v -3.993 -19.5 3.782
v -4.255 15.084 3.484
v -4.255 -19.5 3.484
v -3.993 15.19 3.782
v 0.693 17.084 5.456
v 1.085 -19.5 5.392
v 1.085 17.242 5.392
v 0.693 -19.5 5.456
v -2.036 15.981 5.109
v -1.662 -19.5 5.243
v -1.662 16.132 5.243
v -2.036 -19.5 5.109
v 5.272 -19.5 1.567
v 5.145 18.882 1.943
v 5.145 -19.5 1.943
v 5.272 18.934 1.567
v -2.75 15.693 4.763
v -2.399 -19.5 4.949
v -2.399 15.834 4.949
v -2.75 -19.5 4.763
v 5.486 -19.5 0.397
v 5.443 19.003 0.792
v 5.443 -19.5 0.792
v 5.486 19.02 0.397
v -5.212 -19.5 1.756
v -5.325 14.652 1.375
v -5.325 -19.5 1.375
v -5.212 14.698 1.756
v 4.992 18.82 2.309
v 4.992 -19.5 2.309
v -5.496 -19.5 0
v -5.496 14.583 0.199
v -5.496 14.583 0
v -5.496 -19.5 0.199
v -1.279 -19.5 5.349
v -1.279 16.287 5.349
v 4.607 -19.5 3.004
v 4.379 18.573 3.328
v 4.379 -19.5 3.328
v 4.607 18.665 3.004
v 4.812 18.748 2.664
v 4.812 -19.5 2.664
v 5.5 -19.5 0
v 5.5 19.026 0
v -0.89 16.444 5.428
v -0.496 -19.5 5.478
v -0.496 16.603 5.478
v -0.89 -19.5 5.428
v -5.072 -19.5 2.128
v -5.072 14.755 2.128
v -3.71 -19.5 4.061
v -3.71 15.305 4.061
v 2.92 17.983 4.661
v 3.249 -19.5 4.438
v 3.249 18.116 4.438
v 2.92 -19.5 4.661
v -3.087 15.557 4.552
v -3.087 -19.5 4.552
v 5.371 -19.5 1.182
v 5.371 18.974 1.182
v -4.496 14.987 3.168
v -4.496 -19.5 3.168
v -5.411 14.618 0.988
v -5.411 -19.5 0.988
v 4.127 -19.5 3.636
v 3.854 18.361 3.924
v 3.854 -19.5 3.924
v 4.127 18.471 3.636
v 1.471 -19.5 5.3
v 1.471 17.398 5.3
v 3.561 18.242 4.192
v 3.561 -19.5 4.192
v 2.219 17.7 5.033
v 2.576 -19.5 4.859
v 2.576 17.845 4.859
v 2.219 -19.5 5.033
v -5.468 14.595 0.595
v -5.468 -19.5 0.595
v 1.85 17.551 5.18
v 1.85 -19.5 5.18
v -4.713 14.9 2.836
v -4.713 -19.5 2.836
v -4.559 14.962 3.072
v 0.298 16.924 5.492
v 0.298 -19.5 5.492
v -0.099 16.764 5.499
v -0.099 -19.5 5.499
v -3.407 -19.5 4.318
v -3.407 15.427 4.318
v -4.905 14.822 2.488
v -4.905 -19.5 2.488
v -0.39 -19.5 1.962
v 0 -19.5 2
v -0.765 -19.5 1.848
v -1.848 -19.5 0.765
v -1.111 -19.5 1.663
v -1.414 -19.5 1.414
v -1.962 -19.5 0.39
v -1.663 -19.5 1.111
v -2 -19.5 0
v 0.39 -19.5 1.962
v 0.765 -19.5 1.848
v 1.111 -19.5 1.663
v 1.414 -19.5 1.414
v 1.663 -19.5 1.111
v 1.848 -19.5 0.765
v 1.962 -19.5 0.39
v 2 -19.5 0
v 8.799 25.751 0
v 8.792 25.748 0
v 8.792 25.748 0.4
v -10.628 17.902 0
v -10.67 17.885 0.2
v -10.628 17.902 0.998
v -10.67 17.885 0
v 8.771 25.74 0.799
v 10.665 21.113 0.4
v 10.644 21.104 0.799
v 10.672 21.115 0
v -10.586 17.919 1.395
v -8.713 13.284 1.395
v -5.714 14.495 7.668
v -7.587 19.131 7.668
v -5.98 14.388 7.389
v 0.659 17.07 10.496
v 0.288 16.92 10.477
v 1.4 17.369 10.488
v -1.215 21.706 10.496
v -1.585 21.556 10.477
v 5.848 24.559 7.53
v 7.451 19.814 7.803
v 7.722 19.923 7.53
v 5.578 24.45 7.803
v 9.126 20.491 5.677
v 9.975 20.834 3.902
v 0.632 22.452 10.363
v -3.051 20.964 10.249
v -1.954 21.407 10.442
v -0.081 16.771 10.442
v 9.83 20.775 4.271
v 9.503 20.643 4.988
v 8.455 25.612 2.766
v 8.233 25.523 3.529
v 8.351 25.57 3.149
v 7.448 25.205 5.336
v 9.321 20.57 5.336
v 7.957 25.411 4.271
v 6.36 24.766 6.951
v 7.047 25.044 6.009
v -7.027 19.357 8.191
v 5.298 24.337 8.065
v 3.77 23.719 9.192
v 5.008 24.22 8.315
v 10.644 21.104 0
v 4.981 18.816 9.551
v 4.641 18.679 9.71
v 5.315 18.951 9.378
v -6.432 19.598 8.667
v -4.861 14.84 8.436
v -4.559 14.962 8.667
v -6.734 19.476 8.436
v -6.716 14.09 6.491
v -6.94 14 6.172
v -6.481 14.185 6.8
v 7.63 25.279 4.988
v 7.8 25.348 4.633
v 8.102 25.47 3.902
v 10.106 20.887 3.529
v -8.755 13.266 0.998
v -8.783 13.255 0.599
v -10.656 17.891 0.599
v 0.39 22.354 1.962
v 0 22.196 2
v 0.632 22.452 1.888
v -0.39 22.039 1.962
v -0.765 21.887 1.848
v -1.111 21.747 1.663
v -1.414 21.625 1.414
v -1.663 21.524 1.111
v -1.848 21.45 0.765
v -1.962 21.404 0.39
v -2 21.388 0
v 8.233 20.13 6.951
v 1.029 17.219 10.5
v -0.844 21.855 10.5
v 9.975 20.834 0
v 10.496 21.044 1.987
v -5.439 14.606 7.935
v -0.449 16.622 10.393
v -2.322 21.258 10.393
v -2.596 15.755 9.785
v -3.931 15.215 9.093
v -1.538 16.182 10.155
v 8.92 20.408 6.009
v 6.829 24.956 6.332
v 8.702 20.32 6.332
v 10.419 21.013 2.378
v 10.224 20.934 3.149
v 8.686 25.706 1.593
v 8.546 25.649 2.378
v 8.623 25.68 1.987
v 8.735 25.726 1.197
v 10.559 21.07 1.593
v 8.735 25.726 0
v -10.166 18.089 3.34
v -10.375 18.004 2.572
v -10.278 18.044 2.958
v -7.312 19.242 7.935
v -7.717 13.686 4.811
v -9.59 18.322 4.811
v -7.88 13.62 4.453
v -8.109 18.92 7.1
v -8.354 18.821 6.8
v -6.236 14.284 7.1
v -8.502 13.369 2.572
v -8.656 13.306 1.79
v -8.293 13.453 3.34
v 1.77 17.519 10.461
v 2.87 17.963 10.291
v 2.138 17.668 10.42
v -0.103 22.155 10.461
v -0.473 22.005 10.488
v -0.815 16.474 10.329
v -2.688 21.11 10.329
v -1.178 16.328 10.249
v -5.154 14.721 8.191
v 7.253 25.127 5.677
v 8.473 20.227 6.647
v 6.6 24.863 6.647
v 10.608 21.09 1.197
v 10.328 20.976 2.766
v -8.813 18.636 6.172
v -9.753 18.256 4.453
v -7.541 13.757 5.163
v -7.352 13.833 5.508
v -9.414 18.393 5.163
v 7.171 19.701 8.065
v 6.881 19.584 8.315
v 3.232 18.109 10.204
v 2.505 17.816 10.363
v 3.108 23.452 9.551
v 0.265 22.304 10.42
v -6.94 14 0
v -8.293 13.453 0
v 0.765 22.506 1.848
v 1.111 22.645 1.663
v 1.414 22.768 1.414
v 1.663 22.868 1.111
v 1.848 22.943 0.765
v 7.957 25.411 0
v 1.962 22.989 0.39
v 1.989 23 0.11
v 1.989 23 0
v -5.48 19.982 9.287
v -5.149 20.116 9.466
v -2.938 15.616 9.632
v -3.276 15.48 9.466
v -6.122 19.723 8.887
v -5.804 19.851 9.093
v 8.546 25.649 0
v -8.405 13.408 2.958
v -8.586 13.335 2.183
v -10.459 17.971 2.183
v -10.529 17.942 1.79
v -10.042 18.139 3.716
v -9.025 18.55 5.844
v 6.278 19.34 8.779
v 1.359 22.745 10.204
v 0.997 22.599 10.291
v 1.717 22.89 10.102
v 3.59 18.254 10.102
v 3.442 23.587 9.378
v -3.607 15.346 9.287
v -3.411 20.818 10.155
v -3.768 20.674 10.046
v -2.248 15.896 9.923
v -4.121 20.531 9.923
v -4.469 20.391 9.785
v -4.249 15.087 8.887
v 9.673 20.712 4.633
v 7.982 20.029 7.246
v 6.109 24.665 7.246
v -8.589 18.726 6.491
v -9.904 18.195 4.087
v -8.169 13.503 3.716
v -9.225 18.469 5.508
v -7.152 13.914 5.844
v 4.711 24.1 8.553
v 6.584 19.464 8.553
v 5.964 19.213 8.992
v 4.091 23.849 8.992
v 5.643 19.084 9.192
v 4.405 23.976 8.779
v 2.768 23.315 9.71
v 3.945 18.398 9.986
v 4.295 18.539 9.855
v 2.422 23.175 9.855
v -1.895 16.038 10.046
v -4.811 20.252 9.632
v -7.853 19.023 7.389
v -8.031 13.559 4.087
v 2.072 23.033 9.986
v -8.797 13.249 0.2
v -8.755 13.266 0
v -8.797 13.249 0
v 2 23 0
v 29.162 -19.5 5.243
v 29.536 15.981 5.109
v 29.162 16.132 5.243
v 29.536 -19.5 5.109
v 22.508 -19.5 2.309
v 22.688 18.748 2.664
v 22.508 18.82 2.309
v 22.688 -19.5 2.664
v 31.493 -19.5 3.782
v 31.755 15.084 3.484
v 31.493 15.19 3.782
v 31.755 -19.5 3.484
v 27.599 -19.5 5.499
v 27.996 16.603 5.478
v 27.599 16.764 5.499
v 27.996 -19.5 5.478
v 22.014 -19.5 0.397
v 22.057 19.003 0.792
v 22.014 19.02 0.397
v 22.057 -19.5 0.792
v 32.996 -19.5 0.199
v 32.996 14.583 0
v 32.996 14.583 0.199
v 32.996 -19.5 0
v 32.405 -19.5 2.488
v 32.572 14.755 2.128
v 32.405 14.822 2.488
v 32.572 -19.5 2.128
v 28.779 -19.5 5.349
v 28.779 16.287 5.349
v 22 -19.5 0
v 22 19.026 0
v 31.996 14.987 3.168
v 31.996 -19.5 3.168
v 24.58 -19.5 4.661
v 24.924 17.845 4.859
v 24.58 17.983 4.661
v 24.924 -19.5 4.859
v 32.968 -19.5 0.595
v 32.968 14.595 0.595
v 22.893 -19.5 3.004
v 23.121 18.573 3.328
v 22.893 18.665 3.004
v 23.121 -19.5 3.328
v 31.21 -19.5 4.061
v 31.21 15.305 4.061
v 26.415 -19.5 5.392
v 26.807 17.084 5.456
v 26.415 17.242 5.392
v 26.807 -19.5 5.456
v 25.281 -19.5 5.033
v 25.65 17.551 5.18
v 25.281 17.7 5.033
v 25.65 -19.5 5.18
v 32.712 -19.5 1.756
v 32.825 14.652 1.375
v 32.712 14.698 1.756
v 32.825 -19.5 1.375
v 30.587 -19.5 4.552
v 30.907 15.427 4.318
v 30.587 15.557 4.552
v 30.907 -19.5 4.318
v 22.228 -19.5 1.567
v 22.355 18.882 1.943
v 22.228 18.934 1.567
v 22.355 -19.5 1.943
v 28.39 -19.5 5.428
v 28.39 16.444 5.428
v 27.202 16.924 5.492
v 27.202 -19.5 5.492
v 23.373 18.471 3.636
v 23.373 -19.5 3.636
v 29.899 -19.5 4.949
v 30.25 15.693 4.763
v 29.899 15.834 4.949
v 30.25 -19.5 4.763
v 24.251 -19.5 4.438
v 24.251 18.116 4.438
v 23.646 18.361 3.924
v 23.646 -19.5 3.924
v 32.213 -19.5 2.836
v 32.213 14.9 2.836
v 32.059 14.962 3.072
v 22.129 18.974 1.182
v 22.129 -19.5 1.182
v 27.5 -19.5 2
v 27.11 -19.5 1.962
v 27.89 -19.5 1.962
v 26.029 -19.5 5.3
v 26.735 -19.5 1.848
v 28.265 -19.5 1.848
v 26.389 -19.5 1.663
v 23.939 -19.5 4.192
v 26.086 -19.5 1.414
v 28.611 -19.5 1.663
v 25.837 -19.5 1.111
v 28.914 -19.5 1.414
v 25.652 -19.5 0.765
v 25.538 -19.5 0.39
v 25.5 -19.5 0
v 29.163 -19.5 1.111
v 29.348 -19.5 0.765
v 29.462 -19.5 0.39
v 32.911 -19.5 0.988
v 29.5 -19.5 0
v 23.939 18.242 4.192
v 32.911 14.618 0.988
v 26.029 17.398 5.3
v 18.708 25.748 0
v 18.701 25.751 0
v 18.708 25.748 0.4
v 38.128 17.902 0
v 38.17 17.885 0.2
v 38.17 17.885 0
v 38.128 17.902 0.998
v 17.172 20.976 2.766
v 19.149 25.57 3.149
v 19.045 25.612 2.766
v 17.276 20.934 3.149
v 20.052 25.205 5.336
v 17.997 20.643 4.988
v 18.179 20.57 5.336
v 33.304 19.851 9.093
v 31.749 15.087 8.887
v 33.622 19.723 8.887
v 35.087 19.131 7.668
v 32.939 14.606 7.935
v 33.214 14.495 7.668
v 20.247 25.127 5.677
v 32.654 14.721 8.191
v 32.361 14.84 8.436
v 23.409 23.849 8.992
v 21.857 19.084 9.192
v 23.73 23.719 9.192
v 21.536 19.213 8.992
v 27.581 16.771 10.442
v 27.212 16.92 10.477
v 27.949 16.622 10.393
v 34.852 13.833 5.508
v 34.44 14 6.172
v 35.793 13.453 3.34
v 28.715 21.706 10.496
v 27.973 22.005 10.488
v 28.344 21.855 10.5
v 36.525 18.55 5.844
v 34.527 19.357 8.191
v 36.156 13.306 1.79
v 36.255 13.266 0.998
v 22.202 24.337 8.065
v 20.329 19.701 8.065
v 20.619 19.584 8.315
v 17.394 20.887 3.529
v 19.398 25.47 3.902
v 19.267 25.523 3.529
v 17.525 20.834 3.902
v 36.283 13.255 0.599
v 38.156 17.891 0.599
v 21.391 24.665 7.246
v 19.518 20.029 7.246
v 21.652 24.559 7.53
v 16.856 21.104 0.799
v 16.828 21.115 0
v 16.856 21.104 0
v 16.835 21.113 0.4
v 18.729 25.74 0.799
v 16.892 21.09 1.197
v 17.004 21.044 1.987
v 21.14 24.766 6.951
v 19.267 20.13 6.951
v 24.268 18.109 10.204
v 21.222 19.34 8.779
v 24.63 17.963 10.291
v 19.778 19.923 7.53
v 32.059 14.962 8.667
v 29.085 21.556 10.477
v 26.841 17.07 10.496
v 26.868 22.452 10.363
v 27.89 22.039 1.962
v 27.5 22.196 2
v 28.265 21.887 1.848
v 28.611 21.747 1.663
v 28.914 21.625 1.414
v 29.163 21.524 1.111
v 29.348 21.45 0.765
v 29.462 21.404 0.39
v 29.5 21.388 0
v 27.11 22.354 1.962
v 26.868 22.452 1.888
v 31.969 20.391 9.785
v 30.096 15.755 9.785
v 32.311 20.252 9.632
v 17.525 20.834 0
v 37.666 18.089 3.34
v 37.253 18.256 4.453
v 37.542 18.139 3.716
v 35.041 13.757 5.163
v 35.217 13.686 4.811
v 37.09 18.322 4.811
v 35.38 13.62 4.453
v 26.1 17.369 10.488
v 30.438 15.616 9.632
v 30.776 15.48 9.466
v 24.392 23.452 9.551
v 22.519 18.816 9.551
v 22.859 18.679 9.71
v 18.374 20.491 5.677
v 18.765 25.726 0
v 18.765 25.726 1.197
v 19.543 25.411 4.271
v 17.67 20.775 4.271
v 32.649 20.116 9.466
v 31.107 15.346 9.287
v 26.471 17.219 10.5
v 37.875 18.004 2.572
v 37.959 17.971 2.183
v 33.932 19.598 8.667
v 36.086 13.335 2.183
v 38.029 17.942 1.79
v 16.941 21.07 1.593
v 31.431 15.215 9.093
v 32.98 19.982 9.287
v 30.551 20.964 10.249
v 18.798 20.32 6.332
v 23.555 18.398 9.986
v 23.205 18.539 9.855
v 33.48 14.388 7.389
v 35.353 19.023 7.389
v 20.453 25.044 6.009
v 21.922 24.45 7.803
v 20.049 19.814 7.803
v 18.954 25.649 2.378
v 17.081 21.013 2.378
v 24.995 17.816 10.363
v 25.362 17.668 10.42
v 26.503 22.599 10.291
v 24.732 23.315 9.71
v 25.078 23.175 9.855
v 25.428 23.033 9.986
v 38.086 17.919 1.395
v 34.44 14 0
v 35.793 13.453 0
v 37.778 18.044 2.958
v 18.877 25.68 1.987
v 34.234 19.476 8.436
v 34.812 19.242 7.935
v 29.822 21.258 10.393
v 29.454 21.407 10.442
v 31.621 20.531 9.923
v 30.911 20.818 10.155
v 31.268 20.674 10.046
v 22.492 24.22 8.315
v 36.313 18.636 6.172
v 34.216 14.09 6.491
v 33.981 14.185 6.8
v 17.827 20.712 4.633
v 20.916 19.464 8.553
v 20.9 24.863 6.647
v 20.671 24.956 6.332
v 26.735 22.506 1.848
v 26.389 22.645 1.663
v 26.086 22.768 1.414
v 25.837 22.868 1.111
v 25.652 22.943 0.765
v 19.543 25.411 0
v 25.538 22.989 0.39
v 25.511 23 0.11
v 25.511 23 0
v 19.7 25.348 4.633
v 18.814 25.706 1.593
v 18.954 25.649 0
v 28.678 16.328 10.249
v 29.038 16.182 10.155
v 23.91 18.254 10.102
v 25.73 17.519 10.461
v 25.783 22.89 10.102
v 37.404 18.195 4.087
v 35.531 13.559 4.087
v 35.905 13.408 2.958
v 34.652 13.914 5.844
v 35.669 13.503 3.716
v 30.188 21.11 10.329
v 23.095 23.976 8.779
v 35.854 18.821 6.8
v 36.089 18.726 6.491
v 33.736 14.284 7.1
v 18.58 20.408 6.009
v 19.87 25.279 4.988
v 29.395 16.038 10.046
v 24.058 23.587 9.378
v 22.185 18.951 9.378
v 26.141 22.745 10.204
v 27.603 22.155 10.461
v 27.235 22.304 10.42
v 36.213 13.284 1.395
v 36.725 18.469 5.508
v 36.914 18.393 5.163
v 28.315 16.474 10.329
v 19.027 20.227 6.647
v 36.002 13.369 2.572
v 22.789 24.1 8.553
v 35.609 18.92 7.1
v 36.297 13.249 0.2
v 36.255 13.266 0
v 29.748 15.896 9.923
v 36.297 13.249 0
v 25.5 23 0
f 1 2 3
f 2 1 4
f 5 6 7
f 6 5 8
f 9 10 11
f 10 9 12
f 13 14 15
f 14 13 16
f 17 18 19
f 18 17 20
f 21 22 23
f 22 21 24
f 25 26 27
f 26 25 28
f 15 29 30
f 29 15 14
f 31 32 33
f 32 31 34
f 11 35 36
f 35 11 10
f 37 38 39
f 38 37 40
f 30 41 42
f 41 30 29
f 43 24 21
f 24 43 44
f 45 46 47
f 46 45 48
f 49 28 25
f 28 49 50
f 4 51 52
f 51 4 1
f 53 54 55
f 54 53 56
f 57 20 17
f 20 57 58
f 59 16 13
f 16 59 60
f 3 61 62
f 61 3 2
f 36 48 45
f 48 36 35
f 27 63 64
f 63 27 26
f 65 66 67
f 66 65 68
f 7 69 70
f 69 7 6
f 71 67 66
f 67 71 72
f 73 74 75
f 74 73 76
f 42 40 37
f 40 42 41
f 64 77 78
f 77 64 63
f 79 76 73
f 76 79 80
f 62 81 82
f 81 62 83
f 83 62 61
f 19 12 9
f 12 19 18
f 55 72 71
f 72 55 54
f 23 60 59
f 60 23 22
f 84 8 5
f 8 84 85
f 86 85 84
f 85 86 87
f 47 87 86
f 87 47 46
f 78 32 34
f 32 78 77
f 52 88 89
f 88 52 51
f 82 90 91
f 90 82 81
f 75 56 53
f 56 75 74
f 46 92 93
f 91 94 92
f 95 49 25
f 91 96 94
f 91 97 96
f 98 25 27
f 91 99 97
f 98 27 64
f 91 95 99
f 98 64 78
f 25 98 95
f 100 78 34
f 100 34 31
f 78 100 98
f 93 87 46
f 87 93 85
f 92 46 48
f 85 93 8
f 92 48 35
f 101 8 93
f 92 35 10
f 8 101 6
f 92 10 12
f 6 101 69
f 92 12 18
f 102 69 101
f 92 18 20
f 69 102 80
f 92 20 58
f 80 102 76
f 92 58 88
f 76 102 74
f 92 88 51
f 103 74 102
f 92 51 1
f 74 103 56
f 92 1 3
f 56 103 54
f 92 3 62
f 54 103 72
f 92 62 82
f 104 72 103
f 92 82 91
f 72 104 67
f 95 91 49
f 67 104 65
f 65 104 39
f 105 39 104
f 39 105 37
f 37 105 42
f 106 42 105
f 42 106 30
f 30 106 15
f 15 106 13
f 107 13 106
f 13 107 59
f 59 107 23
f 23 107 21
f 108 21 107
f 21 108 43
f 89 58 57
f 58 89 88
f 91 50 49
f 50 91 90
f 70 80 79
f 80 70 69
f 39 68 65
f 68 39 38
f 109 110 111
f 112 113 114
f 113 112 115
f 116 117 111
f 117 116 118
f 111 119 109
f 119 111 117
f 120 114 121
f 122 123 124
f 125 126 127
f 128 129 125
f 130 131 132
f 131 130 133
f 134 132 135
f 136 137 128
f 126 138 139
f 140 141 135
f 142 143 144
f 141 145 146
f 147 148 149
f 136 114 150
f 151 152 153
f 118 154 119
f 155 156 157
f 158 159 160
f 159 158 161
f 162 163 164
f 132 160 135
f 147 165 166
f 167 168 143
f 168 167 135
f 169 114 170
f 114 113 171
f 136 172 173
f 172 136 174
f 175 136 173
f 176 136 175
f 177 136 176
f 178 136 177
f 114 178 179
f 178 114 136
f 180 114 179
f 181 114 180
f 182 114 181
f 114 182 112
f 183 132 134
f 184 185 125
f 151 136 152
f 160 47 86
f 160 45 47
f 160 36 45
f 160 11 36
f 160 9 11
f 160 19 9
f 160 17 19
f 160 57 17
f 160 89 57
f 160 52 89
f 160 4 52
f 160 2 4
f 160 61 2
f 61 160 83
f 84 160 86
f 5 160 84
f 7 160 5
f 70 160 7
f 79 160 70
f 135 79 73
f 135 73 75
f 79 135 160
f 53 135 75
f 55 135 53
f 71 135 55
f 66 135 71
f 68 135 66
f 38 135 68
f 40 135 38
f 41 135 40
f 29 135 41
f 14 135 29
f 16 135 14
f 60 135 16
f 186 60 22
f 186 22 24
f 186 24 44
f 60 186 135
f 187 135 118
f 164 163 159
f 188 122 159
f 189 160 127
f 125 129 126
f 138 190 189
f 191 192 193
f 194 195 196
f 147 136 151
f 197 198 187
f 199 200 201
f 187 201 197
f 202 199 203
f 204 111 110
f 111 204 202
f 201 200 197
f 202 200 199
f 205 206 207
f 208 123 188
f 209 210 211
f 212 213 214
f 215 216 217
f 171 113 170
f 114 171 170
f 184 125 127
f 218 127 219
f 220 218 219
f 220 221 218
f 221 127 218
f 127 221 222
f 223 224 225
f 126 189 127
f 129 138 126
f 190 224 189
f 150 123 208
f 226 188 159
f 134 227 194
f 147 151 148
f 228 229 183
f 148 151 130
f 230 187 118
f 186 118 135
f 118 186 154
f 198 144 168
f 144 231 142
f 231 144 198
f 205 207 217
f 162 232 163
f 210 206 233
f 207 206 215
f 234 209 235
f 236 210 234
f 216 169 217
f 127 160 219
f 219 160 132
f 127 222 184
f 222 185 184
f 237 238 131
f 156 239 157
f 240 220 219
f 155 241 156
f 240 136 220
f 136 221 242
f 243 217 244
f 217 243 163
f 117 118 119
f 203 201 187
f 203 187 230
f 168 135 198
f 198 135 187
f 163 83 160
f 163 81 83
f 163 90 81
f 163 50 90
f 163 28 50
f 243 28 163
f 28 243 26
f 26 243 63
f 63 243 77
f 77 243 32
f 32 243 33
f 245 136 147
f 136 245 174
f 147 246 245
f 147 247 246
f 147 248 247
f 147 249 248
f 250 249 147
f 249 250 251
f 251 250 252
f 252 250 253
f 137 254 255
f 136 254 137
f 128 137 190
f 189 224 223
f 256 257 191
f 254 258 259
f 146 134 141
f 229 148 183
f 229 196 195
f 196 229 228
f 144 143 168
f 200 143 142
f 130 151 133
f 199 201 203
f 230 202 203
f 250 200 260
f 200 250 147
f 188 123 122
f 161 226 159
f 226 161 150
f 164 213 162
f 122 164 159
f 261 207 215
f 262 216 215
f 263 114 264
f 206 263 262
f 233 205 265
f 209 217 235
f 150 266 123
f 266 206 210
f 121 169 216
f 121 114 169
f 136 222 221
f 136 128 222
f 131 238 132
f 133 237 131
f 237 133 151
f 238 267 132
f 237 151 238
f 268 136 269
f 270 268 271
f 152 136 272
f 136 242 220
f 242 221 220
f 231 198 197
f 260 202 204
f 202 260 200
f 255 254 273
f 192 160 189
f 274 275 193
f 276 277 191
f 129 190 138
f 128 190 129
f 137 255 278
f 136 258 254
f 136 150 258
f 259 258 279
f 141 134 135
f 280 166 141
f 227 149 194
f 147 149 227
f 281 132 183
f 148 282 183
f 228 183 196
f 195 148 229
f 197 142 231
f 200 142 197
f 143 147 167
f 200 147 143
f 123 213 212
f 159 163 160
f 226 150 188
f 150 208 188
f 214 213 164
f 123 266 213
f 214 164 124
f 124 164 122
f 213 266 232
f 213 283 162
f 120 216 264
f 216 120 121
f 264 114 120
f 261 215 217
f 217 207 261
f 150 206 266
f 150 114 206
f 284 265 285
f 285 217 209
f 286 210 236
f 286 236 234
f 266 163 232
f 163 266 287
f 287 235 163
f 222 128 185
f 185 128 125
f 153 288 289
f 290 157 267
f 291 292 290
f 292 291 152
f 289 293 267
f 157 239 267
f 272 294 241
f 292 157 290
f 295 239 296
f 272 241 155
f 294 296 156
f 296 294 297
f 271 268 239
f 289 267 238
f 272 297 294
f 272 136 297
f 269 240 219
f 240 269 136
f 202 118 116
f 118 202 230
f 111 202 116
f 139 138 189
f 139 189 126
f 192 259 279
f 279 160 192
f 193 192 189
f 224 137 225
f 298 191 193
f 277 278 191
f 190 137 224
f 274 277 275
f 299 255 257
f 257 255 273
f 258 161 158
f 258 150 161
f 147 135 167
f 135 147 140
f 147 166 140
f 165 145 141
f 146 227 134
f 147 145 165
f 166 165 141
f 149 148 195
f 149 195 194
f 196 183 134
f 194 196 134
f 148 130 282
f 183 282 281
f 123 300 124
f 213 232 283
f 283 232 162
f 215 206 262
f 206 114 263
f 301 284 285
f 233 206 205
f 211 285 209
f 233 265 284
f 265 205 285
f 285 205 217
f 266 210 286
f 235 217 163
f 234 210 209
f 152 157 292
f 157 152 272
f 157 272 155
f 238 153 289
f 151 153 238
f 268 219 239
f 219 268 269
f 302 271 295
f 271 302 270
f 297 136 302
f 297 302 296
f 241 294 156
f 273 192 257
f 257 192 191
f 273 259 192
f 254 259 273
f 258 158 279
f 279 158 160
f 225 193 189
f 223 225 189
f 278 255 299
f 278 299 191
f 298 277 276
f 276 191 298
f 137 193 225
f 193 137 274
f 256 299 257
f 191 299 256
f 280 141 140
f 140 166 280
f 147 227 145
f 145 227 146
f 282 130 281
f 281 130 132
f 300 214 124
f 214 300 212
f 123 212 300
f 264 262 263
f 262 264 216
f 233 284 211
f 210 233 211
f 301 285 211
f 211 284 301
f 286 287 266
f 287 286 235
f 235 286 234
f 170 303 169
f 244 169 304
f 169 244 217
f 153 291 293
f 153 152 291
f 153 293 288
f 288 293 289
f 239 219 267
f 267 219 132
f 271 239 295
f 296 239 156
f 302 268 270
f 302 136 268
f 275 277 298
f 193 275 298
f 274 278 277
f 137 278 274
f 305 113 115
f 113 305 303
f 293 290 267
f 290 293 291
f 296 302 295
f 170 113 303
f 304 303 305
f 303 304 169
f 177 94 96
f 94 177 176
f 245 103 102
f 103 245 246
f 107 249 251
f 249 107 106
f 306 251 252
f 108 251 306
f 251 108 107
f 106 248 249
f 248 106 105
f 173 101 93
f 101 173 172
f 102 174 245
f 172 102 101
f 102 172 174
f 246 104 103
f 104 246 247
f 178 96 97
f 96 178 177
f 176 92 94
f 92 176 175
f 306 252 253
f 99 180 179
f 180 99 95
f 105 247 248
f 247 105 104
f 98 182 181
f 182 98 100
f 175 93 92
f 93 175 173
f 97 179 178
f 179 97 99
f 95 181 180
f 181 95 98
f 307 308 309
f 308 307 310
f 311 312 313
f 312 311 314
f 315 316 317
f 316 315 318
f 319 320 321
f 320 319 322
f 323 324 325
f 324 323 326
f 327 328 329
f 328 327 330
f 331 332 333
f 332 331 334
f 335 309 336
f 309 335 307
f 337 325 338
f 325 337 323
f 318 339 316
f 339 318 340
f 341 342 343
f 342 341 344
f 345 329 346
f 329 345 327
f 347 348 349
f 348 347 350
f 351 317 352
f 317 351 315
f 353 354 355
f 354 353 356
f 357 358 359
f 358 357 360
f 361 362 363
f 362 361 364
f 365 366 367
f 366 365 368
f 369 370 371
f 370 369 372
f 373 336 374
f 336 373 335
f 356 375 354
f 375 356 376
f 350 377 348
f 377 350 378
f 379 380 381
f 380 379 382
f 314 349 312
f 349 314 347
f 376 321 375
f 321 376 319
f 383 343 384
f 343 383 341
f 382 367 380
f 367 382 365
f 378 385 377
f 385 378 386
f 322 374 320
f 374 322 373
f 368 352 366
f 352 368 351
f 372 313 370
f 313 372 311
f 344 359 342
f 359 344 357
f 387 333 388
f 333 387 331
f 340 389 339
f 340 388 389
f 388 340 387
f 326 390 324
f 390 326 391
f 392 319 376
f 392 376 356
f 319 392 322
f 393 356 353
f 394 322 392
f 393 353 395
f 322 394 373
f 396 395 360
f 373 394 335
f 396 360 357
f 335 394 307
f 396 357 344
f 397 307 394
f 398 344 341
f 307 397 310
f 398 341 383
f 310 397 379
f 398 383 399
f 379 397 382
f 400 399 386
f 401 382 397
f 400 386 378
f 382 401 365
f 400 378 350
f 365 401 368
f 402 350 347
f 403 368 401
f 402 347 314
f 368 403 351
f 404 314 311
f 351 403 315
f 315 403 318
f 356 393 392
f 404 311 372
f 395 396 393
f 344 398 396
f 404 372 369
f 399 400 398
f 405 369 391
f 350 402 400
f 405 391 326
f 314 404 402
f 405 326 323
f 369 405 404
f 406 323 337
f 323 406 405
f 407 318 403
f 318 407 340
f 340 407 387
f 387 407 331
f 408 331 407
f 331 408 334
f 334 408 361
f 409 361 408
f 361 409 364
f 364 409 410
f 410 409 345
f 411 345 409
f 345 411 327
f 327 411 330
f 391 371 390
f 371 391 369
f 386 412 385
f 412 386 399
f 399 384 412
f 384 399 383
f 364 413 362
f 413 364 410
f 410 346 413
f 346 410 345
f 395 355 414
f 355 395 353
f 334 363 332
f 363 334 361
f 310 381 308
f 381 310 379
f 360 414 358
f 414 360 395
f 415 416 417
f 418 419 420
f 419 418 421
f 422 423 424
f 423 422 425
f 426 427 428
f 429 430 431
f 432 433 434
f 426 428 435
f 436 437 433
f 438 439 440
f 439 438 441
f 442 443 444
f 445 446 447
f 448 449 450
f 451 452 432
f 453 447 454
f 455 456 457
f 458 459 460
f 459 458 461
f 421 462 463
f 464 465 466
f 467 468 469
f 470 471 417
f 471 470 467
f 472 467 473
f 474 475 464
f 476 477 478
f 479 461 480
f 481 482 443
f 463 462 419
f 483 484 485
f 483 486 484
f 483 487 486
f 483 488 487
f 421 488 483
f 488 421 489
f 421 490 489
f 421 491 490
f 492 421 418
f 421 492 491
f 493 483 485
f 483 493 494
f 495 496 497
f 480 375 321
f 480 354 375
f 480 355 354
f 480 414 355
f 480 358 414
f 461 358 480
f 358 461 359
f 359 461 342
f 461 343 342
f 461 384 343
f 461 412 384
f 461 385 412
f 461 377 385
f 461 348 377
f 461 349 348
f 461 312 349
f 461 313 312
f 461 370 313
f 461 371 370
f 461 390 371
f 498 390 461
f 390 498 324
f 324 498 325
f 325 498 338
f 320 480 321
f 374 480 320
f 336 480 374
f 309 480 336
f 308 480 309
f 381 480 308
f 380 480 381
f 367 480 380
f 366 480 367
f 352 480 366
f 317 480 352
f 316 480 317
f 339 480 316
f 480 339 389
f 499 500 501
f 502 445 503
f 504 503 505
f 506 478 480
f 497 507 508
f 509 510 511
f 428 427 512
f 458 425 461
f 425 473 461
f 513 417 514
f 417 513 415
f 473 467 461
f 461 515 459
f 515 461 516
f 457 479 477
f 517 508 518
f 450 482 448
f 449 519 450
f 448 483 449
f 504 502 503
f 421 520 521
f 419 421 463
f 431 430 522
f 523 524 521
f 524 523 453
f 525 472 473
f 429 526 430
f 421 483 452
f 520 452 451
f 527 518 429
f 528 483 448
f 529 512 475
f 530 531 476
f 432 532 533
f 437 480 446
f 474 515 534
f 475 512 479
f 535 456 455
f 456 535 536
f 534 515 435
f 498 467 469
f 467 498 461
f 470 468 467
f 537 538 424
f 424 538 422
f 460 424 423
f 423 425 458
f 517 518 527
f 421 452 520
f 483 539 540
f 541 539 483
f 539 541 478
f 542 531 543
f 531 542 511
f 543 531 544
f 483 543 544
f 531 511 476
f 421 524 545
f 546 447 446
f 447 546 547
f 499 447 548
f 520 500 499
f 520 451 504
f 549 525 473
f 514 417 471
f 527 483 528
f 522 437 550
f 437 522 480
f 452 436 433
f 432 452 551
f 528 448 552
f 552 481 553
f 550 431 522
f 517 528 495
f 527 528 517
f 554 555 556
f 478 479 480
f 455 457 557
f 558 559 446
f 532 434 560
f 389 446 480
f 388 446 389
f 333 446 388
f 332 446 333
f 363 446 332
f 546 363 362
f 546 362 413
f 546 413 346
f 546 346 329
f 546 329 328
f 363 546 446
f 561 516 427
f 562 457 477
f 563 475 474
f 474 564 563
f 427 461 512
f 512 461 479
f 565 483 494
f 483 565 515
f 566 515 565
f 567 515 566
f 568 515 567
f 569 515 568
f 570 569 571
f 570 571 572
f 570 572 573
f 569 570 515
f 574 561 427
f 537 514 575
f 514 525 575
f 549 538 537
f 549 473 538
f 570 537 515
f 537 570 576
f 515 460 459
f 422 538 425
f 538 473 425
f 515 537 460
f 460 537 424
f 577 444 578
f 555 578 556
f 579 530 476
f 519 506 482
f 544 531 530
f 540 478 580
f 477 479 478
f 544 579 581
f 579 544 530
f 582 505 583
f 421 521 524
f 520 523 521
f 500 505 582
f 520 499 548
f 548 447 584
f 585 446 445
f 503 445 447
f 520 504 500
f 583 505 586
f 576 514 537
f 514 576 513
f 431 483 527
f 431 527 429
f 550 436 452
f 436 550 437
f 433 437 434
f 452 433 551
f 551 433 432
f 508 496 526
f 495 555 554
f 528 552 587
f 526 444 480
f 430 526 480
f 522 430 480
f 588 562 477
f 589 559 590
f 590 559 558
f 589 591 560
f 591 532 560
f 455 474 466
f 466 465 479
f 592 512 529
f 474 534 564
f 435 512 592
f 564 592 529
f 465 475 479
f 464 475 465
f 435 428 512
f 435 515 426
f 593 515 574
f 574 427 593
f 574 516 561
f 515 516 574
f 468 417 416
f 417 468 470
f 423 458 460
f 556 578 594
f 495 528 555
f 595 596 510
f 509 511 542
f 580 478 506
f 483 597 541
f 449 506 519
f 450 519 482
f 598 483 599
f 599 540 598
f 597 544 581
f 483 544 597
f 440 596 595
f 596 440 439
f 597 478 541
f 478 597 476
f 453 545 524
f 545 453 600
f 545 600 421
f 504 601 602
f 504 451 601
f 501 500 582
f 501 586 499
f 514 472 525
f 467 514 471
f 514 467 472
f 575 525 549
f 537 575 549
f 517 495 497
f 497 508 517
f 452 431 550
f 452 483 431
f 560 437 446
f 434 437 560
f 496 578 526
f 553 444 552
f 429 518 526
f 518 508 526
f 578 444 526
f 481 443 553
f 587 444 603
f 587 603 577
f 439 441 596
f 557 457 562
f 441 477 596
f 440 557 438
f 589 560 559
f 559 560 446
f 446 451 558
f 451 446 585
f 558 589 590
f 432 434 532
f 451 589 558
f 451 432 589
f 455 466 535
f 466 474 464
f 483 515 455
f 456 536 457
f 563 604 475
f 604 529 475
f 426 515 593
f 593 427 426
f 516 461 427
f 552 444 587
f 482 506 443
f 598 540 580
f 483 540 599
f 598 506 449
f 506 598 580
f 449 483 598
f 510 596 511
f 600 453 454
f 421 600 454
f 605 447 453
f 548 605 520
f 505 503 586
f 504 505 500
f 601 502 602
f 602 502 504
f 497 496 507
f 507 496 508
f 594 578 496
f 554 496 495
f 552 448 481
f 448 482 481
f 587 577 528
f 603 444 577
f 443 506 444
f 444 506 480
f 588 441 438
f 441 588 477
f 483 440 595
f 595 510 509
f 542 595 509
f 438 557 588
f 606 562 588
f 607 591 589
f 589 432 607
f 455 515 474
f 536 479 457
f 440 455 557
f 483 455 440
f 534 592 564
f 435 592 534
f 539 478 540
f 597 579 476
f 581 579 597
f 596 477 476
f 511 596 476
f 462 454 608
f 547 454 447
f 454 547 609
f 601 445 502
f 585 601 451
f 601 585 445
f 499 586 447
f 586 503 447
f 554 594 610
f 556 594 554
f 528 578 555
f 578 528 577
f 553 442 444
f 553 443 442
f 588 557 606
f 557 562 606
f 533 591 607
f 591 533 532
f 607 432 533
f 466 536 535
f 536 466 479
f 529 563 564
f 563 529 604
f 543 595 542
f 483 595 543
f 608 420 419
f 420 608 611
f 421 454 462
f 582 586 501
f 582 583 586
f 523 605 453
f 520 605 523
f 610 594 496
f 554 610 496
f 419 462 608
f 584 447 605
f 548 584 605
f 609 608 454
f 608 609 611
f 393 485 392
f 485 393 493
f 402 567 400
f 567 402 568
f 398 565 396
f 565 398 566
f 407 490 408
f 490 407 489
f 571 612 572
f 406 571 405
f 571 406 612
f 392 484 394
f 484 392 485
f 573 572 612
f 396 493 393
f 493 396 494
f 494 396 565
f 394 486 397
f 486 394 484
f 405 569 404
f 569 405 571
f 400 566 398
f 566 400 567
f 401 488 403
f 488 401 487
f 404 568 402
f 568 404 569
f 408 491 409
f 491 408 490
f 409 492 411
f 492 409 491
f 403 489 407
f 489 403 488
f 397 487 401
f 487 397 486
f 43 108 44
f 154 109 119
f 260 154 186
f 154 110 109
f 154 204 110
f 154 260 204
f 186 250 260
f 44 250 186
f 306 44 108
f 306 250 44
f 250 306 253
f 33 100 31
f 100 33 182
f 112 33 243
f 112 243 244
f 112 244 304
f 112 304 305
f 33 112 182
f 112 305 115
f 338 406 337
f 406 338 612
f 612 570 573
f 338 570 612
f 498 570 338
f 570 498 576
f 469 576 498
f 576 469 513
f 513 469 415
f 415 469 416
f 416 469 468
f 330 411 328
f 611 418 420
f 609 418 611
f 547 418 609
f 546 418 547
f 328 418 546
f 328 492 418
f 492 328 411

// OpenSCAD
$fa = 1;
$fs = 0.4;
wire_radius=2;
hole_radius=5.5;
length=39;
angle=22;
lip_width=5;
lip_thickness=5;
//cylinder(h=length, r=wire_diameter);
module solid_peg() {
    cylinder(h=length, r=hole_radius, center=true);
    translate([0,0,length/-2])
        rotate([0,angle,0])
        cylinder(h=lip_thickness, r=hole_radius+lip_width, center=true);
}
module hollow_peg() {
    rotate([90,0,0])
    difference() {
        solid_peg();
        cylinder(h=length+lip_thickness+2,r=    wire_radius, center=true);
    }
}
module two_hollow_pegs() {
    hollow_peg();
    translate([hole_radius*5,0,0])
        rotate([0, 180, 0])
        hollow_peg();
}
difference() {
    two_hollow_pegs();
    translate([-2*length, -2*length,-4*hole_radius])
        cube([length*4, length*4, hole_radius*4]);
}
